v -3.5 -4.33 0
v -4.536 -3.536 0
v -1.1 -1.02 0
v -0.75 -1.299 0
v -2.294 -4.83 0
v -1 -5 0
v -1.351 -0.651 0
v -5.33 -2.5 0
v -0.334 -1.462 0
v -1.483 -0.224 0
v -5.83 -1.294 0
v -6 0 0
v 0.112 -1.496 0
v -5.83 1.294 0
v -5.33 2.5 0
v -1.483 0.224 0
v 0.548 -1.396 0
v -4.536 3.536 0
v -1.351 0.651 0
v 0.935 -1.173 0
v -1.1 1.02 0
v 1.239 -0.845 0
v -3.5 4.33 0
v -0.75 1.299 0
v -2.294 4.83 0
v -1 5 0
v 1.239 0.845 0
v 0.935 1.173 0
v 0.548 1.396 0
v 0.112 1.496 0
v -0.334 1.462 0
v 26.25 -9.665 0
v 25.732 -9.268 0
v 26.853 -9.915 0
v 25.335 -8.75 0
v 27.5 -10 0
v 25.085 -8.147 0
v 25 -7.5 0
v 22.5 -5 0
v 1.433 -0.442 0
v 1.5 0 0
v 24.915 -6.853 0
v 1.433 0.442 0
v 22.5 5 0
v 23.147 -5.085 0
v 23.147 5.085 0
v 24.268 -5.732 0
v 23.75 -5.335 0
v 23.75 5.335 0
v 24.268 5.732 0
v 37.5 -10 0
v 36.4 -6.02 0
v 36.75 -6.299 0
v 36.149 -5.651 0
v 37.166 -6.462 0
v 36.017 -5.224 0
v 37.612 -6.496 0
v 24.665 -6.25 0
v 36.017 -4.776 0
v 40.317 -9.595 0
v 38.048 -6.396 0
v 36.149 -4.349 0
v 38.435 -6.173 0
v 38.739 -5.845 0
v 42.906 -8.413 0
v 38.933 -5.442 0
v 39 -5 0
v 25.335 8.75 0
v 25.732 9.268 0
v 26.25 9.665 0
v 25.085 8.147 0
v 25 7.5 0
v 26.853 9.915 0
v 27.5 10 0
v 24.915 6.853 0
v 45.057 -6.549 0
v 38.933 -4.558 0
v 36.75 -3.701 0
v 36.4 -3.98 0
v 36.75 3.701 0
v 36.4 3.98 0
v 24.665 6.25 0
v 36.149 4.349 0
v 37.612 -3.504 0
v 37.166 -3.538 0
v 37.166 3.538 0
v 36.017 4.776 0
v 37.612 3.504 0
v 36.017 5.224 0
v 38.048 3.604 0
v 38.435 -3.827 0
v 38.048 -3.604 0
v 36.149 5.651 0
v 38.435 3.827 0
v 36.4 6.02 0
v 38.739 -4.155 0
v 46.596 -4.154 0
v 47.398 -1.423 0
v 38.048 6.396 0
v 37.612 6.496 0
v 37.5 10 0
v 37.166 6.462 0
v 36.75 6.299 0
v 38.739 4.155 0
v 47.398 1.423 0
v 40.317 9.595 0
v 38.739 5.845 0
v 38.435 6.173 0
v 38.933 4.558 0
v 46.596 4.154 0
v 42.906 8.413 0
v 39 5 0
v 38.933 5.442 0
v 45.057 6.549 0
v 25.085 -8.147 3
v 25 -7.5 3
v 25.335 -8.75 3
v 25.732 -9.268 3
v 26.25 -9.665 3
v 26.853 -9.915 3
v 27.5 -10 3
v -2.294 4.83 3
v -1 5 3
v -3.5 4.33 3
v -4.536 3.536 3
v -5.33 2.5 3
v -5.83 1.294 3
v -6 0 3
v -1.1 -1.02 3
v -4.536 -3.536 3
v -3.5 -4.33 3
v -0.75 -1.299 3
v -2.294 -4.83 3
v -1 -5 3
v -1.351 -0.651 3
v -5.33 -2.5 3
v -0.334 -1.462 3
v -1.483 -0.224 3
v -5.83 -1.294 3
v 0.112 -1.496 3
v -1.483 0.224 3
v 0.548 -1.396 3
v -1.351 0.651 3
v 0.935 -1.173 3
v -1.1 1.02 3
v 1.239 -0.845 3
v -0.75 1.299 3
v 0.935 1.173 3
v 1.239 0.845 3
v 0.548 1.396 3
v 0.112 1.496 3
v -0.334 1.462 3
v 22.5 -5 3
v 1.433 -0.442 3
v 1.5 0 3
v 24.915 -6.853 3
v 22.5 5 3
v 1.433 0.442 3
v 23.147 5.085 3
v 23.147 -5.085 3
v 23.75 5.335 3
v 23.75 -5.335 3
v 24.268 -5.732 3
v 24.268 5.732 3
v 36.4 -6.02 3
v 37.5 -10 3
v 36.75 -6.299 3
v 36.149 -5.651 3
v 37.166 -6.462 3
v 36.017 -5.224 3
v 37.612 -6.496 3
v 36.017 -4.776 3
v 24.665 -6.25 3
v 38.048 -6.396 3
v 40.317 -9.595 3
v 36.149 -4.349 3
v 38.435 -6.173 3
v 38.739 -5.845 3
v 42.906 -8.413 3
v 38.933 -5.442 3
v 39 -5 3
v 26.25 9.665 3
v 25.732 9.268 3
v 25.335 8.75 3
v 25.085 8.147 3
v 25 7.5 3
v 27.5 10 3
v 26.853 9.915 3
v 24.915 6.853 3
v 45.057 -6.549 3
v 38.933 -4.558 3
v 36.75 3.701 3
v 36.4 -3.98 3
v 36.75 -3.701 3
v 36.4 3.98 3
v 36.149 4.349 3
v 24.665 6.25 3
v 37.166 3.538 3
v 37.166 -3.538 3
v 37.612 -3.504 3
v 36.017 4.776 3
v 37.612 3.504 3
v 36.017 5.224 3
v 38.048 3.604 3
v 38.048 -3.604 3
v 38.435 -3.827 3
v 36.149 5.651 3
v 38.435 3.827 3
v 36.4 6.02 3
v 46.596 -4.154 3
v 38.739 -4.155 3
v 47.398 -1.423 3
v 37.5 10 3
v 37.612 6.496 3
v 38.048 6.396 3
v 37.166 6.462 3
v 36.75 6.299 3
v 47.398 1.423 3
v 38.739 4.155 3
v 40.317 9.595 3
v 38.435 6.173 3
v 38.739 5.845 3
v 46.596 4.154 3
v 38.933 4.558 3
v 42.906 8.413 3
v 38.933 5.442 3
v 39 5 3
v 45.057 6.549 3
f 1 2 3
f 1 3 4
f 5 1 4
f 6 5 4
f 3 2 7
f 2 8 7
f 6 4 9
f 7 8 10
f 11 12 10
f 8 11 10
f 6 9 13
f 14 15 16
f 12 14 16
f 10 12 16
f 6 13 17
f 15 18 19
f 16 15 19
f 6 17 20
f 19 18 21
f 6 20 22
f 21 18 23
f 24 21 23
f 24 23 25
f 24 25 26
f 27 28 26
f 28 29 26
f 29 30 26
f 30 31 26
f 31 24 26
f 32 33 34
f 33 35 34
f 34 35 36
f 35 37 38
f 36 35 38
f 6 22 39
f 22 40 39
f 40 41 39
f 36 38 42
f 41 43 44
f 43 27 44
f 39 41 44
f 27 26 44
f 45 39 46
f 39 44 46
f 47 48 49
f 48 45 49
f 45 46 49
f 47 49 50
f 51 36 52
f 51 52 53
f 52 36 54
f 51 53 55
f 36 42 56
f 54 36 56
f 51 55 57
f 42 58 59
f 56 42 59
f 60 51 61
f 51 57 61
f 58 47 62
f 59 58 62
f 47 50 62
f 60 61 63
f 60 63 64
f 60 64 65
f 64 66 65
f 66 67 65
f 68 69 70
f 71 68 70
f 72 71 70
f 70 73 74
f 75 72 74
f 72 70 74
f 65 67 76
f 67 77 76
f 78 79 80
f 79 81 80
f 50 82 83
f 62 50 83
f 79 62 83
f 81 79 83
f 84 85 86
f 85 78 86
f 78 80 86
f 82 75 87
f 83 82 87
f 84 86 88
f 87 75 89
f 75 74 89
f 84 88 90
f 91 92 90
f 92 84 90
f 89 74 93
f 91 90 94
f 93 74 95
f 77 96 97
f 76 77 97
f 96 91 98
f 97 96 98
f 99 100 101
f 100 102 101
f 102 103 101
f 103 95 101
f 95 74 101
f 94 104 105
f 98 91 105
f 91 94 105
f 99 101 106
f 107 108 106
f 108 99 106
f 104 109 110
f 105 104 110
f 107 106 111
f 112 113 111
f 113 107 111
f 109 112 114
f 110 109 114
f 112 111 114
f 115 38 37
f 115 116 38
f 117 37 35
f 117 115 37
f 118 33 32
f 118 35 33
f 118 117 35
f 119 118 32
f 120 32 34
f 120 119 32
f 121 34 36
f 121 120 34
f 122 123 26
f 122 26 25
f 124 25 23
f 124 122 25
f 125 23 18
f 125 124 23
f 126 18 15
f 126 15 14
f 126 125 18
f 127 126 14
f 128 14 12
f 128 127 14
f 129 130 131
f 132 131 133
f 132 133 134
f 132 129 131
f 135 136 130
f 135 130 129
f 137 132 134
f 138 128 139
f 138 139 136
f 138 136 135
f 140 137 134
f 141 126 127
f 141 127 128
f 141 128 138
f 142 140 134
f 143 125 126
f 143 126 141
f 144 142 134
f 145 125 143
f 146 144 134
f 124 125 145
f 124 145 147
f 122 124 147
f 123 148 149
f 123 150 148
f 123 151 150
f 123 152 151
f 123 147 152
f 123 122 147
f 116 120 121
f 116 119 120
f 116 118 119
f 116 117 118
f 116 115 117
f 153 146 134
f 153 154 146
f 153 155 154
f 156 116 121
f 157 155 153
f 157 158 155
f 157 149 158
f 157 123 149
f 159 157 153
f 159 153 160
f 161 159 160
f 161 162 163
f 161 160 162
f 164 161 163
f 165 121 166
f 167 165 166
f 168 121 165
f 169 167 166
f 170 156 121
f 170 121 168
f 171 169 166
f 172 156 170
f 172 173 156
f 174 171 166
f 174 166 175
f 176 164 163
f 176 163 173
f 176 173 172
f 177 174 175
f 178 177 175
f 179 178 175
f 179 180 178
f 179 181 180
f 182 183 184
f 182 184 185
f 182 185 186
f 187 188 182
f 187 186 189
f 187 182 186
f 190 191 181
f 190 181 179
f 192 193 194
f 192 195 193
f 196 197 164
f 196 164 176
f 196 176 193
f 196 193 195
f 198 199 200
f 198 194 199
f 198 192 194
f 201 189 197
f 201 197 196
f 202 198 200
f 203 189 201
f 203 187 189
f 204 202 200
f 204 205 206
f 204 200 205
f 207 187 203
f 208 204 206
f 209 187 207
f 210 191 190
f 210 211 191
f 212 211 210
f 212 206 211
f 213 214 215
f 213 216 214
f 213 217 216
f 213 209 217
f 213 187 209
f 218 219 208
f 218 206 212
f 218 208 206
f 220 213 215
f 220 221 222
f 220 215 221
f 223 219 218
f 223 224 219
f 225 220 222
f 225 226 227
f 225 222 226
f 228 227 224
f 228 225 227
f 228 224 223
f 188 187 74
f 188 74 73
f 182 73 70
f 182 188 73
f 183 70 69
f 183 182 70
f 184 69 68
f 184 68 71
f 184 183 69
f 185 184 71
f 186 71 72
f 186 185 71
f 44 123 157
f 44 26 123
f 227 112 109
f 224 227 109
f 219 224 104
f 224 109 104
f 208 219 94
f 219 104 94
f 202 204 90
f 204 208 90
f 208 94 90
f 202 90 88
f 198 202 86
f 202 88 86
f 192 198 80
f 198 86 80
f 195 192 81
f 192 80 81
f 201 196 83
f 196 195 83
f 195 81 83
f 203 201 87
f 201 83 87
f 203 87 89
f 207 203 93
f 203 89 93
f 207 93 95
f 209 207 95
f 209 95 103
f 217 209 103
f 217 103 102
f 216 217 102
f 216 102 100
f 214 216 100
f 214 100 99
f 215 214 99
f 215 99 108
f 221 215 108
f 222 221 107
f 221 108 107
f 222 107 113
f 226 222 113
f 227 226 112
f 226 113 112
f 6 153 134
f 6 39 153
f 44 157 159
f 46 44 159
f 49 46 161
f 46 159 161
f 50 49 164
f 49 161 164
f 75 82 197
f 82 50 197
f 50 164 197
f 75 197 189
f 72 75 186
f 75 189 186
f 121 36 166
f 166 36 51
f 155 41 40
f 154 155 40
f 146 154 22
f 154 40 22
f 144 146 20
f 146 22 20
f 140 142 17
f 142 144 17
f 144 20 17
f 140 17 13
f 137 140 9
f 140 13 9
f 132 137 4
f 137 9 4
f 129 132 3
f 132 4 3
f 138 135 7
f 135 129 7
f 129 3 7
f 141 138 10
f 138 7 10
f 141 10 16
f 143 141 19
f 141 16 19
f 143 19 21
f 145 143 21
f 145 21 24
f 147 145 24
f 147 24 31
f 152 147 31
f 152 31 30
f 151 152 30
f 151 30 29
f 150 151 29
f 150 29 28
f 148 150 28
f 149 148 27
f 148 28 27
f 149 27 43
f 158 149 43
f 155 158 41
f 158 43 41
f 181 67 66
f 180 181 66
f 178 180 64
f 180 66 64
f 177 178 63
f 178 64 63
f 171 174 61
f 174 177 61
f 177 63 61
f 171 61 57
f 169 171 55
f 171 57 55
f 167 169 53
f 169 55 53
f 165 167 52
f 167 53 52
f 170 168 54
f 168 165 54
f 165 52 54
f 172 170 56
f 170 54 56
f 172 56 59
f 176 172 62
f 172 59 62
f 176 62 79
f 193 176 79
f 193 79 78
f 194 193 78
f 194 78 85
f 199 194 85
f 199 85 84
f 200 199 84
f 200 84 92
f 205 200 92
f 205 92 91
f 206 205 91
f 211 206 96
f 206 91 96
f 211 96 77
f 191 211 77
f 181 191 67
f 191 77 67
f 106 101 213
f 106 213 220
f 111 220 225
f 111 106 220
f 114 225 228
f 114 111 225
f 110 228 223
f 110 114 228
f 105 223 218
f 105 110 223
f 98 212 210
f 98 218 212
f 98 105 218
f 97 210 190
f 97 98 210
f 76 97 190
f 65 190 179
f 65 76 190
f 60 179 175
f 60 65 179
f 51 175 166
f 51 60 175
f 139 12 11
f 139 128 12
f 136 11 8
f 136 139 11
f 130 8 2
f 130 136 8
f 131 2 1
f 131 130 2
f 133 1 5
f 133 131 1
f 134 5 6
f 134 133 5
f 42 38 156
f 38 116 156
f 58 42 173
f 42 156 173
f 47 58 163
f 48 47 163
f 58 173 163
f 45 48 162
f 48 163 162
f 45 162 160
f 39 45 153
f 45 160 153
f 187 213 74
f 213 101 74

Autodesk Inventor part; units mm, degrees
ref_plane "YZ Plane" through (0, 0, 0) normal (1, 0, 0) x (0, 1, 0)
ref_plane "XZ Plane" through (0, 0, 0) normal (0, 1, 0) x (-1, 0, 0)
ref_plane "XY Plane" through (0, 0, 0) normal (0, 0, 1) x (1, 0, 0)
sketch "Sketch1" plane through (0, 0, 0) normal (0, 0, 1) x (1, 0, 0)
  line L0 (0, 0) -> (37.5, 0) construction
  line L1 (0, -10) -> (37.5, -10)
  line L2 (37.5, 10) -> (0, 10)
  arc A0 (0, 10) -> (0, -10) centre (0, 0) ccw
  arc A1 (37.5, -10) -> (37.5, 10) centre (37.5, 0) ccw
  line L3 (0, 0) -> (37.5, 0) construction
  circle A2 centre (0, 0) radius 1.5
  circle A3 centre (37.5, -5) radius 1.5
  circle A4 centre (37.5, 5) radius 1.5
  point P0 (18.75, 0)
  dimension "d0" = 37.5
  dimension "d1" = 0
  dimension "d2" = 20
  dimension "d3" = 3
  dimension "d4" = 3
  dimension "d5" = 3
  dimension "d6" = 10
  dimension "d7" = 5
  dimension "d8" = 0
  dimension "d9" = 0
extrude "Extrusion1" add sketch "Sketch1" along normal blind 3
sketch "Sketch2" plane through (0, 0, 0) normal (0, 0, -1) x (-1, 0, 0)
  line L0 (6, 5) -> (-25, 5)
  line L1 (-25, 10) -> (-25, -10)
  line L2 (-25, -5) -> (6, -5)
  line L3 (6, -5) -> (6, 5)
  arc A0 (-37.5, 10) -> (-37.5, -10) centre (-37.5, 0) ccw projected
  line L4 (0, -10) -> (-37.5, -10) projected
  arc A1 (0, -10) -> (0, 10) centre (0, 0) ccw projected
  line L5 (-37.5, 10) -> (0, 10) projected
  circle A2 centre (-37.5, 5) radius 1.5 projected
  circle A3 centre (-37.5, -5) radius 1.5 projected
  circle A4 centre (0, 0) radius 1.5 projected
  dimension "d12" = 6
  dimension "d13" = 5
  dimension "d14" = 5
  dimension "d15" = 25
extrude "Extrusion2" cut sketch "Sketch2" against normal up to surface (3 mm away) contours L0 L1 L5 A1 L4 L2 L3
fillet "Fillet1" radius 2.5 4 edges at (25, 5, 1.5) (25, 10, 1.5) (25, -5, 1.5) (25, -10, 1.5)
fillet "Fillet2" radius 5 2 edges at (-6, 5, 1.5) (-6, -5, 1.5)
sketch "Sketch3" plane through (0, 0, 3) normal (0, 0, 1) x (1, 0, 0)
  arc A0 (-1, 5) -> (-1, -5) centre (-1, 0) ccw projected
  line L0 (-1, -5) -> (22.5, -5) projected
  arc A1 (25, -7.5) -> (22.5, -5) centre (22.5, -7.5) ccw projected
  arc A2 (25, -7.5) -> (27.5, -10) centre (27.5, -7.5) ccw projected
  line L1 (27.5, -10) -> (37.5, -10) projected
  arc A3 (37.5, -10) -> (37.5, 10) centre (37.5, 0) ccw projected
  line L2 (37.5, 10) -> (27.5, 10) projected
  arc A4 (27.5, 10) -> (25, 7.5) centre (27.5, 7.5) ccw projected
  arc A5 (22.5, 5) -> (25, 7.5) centre (22.5, 7.5) ccw projected
  line L3 (22.5, 5) -> (-1, 5) projected
  circle A6 centre (37.5, 5) radius 1.5 projected
  circle A7 centre (37.5, -5) radius 1.5 projected
  circle A8 centre (0, 0) radius 1.5 projected
properties part number "Arm5_3D" material "Aluminum 6061, Welded"
